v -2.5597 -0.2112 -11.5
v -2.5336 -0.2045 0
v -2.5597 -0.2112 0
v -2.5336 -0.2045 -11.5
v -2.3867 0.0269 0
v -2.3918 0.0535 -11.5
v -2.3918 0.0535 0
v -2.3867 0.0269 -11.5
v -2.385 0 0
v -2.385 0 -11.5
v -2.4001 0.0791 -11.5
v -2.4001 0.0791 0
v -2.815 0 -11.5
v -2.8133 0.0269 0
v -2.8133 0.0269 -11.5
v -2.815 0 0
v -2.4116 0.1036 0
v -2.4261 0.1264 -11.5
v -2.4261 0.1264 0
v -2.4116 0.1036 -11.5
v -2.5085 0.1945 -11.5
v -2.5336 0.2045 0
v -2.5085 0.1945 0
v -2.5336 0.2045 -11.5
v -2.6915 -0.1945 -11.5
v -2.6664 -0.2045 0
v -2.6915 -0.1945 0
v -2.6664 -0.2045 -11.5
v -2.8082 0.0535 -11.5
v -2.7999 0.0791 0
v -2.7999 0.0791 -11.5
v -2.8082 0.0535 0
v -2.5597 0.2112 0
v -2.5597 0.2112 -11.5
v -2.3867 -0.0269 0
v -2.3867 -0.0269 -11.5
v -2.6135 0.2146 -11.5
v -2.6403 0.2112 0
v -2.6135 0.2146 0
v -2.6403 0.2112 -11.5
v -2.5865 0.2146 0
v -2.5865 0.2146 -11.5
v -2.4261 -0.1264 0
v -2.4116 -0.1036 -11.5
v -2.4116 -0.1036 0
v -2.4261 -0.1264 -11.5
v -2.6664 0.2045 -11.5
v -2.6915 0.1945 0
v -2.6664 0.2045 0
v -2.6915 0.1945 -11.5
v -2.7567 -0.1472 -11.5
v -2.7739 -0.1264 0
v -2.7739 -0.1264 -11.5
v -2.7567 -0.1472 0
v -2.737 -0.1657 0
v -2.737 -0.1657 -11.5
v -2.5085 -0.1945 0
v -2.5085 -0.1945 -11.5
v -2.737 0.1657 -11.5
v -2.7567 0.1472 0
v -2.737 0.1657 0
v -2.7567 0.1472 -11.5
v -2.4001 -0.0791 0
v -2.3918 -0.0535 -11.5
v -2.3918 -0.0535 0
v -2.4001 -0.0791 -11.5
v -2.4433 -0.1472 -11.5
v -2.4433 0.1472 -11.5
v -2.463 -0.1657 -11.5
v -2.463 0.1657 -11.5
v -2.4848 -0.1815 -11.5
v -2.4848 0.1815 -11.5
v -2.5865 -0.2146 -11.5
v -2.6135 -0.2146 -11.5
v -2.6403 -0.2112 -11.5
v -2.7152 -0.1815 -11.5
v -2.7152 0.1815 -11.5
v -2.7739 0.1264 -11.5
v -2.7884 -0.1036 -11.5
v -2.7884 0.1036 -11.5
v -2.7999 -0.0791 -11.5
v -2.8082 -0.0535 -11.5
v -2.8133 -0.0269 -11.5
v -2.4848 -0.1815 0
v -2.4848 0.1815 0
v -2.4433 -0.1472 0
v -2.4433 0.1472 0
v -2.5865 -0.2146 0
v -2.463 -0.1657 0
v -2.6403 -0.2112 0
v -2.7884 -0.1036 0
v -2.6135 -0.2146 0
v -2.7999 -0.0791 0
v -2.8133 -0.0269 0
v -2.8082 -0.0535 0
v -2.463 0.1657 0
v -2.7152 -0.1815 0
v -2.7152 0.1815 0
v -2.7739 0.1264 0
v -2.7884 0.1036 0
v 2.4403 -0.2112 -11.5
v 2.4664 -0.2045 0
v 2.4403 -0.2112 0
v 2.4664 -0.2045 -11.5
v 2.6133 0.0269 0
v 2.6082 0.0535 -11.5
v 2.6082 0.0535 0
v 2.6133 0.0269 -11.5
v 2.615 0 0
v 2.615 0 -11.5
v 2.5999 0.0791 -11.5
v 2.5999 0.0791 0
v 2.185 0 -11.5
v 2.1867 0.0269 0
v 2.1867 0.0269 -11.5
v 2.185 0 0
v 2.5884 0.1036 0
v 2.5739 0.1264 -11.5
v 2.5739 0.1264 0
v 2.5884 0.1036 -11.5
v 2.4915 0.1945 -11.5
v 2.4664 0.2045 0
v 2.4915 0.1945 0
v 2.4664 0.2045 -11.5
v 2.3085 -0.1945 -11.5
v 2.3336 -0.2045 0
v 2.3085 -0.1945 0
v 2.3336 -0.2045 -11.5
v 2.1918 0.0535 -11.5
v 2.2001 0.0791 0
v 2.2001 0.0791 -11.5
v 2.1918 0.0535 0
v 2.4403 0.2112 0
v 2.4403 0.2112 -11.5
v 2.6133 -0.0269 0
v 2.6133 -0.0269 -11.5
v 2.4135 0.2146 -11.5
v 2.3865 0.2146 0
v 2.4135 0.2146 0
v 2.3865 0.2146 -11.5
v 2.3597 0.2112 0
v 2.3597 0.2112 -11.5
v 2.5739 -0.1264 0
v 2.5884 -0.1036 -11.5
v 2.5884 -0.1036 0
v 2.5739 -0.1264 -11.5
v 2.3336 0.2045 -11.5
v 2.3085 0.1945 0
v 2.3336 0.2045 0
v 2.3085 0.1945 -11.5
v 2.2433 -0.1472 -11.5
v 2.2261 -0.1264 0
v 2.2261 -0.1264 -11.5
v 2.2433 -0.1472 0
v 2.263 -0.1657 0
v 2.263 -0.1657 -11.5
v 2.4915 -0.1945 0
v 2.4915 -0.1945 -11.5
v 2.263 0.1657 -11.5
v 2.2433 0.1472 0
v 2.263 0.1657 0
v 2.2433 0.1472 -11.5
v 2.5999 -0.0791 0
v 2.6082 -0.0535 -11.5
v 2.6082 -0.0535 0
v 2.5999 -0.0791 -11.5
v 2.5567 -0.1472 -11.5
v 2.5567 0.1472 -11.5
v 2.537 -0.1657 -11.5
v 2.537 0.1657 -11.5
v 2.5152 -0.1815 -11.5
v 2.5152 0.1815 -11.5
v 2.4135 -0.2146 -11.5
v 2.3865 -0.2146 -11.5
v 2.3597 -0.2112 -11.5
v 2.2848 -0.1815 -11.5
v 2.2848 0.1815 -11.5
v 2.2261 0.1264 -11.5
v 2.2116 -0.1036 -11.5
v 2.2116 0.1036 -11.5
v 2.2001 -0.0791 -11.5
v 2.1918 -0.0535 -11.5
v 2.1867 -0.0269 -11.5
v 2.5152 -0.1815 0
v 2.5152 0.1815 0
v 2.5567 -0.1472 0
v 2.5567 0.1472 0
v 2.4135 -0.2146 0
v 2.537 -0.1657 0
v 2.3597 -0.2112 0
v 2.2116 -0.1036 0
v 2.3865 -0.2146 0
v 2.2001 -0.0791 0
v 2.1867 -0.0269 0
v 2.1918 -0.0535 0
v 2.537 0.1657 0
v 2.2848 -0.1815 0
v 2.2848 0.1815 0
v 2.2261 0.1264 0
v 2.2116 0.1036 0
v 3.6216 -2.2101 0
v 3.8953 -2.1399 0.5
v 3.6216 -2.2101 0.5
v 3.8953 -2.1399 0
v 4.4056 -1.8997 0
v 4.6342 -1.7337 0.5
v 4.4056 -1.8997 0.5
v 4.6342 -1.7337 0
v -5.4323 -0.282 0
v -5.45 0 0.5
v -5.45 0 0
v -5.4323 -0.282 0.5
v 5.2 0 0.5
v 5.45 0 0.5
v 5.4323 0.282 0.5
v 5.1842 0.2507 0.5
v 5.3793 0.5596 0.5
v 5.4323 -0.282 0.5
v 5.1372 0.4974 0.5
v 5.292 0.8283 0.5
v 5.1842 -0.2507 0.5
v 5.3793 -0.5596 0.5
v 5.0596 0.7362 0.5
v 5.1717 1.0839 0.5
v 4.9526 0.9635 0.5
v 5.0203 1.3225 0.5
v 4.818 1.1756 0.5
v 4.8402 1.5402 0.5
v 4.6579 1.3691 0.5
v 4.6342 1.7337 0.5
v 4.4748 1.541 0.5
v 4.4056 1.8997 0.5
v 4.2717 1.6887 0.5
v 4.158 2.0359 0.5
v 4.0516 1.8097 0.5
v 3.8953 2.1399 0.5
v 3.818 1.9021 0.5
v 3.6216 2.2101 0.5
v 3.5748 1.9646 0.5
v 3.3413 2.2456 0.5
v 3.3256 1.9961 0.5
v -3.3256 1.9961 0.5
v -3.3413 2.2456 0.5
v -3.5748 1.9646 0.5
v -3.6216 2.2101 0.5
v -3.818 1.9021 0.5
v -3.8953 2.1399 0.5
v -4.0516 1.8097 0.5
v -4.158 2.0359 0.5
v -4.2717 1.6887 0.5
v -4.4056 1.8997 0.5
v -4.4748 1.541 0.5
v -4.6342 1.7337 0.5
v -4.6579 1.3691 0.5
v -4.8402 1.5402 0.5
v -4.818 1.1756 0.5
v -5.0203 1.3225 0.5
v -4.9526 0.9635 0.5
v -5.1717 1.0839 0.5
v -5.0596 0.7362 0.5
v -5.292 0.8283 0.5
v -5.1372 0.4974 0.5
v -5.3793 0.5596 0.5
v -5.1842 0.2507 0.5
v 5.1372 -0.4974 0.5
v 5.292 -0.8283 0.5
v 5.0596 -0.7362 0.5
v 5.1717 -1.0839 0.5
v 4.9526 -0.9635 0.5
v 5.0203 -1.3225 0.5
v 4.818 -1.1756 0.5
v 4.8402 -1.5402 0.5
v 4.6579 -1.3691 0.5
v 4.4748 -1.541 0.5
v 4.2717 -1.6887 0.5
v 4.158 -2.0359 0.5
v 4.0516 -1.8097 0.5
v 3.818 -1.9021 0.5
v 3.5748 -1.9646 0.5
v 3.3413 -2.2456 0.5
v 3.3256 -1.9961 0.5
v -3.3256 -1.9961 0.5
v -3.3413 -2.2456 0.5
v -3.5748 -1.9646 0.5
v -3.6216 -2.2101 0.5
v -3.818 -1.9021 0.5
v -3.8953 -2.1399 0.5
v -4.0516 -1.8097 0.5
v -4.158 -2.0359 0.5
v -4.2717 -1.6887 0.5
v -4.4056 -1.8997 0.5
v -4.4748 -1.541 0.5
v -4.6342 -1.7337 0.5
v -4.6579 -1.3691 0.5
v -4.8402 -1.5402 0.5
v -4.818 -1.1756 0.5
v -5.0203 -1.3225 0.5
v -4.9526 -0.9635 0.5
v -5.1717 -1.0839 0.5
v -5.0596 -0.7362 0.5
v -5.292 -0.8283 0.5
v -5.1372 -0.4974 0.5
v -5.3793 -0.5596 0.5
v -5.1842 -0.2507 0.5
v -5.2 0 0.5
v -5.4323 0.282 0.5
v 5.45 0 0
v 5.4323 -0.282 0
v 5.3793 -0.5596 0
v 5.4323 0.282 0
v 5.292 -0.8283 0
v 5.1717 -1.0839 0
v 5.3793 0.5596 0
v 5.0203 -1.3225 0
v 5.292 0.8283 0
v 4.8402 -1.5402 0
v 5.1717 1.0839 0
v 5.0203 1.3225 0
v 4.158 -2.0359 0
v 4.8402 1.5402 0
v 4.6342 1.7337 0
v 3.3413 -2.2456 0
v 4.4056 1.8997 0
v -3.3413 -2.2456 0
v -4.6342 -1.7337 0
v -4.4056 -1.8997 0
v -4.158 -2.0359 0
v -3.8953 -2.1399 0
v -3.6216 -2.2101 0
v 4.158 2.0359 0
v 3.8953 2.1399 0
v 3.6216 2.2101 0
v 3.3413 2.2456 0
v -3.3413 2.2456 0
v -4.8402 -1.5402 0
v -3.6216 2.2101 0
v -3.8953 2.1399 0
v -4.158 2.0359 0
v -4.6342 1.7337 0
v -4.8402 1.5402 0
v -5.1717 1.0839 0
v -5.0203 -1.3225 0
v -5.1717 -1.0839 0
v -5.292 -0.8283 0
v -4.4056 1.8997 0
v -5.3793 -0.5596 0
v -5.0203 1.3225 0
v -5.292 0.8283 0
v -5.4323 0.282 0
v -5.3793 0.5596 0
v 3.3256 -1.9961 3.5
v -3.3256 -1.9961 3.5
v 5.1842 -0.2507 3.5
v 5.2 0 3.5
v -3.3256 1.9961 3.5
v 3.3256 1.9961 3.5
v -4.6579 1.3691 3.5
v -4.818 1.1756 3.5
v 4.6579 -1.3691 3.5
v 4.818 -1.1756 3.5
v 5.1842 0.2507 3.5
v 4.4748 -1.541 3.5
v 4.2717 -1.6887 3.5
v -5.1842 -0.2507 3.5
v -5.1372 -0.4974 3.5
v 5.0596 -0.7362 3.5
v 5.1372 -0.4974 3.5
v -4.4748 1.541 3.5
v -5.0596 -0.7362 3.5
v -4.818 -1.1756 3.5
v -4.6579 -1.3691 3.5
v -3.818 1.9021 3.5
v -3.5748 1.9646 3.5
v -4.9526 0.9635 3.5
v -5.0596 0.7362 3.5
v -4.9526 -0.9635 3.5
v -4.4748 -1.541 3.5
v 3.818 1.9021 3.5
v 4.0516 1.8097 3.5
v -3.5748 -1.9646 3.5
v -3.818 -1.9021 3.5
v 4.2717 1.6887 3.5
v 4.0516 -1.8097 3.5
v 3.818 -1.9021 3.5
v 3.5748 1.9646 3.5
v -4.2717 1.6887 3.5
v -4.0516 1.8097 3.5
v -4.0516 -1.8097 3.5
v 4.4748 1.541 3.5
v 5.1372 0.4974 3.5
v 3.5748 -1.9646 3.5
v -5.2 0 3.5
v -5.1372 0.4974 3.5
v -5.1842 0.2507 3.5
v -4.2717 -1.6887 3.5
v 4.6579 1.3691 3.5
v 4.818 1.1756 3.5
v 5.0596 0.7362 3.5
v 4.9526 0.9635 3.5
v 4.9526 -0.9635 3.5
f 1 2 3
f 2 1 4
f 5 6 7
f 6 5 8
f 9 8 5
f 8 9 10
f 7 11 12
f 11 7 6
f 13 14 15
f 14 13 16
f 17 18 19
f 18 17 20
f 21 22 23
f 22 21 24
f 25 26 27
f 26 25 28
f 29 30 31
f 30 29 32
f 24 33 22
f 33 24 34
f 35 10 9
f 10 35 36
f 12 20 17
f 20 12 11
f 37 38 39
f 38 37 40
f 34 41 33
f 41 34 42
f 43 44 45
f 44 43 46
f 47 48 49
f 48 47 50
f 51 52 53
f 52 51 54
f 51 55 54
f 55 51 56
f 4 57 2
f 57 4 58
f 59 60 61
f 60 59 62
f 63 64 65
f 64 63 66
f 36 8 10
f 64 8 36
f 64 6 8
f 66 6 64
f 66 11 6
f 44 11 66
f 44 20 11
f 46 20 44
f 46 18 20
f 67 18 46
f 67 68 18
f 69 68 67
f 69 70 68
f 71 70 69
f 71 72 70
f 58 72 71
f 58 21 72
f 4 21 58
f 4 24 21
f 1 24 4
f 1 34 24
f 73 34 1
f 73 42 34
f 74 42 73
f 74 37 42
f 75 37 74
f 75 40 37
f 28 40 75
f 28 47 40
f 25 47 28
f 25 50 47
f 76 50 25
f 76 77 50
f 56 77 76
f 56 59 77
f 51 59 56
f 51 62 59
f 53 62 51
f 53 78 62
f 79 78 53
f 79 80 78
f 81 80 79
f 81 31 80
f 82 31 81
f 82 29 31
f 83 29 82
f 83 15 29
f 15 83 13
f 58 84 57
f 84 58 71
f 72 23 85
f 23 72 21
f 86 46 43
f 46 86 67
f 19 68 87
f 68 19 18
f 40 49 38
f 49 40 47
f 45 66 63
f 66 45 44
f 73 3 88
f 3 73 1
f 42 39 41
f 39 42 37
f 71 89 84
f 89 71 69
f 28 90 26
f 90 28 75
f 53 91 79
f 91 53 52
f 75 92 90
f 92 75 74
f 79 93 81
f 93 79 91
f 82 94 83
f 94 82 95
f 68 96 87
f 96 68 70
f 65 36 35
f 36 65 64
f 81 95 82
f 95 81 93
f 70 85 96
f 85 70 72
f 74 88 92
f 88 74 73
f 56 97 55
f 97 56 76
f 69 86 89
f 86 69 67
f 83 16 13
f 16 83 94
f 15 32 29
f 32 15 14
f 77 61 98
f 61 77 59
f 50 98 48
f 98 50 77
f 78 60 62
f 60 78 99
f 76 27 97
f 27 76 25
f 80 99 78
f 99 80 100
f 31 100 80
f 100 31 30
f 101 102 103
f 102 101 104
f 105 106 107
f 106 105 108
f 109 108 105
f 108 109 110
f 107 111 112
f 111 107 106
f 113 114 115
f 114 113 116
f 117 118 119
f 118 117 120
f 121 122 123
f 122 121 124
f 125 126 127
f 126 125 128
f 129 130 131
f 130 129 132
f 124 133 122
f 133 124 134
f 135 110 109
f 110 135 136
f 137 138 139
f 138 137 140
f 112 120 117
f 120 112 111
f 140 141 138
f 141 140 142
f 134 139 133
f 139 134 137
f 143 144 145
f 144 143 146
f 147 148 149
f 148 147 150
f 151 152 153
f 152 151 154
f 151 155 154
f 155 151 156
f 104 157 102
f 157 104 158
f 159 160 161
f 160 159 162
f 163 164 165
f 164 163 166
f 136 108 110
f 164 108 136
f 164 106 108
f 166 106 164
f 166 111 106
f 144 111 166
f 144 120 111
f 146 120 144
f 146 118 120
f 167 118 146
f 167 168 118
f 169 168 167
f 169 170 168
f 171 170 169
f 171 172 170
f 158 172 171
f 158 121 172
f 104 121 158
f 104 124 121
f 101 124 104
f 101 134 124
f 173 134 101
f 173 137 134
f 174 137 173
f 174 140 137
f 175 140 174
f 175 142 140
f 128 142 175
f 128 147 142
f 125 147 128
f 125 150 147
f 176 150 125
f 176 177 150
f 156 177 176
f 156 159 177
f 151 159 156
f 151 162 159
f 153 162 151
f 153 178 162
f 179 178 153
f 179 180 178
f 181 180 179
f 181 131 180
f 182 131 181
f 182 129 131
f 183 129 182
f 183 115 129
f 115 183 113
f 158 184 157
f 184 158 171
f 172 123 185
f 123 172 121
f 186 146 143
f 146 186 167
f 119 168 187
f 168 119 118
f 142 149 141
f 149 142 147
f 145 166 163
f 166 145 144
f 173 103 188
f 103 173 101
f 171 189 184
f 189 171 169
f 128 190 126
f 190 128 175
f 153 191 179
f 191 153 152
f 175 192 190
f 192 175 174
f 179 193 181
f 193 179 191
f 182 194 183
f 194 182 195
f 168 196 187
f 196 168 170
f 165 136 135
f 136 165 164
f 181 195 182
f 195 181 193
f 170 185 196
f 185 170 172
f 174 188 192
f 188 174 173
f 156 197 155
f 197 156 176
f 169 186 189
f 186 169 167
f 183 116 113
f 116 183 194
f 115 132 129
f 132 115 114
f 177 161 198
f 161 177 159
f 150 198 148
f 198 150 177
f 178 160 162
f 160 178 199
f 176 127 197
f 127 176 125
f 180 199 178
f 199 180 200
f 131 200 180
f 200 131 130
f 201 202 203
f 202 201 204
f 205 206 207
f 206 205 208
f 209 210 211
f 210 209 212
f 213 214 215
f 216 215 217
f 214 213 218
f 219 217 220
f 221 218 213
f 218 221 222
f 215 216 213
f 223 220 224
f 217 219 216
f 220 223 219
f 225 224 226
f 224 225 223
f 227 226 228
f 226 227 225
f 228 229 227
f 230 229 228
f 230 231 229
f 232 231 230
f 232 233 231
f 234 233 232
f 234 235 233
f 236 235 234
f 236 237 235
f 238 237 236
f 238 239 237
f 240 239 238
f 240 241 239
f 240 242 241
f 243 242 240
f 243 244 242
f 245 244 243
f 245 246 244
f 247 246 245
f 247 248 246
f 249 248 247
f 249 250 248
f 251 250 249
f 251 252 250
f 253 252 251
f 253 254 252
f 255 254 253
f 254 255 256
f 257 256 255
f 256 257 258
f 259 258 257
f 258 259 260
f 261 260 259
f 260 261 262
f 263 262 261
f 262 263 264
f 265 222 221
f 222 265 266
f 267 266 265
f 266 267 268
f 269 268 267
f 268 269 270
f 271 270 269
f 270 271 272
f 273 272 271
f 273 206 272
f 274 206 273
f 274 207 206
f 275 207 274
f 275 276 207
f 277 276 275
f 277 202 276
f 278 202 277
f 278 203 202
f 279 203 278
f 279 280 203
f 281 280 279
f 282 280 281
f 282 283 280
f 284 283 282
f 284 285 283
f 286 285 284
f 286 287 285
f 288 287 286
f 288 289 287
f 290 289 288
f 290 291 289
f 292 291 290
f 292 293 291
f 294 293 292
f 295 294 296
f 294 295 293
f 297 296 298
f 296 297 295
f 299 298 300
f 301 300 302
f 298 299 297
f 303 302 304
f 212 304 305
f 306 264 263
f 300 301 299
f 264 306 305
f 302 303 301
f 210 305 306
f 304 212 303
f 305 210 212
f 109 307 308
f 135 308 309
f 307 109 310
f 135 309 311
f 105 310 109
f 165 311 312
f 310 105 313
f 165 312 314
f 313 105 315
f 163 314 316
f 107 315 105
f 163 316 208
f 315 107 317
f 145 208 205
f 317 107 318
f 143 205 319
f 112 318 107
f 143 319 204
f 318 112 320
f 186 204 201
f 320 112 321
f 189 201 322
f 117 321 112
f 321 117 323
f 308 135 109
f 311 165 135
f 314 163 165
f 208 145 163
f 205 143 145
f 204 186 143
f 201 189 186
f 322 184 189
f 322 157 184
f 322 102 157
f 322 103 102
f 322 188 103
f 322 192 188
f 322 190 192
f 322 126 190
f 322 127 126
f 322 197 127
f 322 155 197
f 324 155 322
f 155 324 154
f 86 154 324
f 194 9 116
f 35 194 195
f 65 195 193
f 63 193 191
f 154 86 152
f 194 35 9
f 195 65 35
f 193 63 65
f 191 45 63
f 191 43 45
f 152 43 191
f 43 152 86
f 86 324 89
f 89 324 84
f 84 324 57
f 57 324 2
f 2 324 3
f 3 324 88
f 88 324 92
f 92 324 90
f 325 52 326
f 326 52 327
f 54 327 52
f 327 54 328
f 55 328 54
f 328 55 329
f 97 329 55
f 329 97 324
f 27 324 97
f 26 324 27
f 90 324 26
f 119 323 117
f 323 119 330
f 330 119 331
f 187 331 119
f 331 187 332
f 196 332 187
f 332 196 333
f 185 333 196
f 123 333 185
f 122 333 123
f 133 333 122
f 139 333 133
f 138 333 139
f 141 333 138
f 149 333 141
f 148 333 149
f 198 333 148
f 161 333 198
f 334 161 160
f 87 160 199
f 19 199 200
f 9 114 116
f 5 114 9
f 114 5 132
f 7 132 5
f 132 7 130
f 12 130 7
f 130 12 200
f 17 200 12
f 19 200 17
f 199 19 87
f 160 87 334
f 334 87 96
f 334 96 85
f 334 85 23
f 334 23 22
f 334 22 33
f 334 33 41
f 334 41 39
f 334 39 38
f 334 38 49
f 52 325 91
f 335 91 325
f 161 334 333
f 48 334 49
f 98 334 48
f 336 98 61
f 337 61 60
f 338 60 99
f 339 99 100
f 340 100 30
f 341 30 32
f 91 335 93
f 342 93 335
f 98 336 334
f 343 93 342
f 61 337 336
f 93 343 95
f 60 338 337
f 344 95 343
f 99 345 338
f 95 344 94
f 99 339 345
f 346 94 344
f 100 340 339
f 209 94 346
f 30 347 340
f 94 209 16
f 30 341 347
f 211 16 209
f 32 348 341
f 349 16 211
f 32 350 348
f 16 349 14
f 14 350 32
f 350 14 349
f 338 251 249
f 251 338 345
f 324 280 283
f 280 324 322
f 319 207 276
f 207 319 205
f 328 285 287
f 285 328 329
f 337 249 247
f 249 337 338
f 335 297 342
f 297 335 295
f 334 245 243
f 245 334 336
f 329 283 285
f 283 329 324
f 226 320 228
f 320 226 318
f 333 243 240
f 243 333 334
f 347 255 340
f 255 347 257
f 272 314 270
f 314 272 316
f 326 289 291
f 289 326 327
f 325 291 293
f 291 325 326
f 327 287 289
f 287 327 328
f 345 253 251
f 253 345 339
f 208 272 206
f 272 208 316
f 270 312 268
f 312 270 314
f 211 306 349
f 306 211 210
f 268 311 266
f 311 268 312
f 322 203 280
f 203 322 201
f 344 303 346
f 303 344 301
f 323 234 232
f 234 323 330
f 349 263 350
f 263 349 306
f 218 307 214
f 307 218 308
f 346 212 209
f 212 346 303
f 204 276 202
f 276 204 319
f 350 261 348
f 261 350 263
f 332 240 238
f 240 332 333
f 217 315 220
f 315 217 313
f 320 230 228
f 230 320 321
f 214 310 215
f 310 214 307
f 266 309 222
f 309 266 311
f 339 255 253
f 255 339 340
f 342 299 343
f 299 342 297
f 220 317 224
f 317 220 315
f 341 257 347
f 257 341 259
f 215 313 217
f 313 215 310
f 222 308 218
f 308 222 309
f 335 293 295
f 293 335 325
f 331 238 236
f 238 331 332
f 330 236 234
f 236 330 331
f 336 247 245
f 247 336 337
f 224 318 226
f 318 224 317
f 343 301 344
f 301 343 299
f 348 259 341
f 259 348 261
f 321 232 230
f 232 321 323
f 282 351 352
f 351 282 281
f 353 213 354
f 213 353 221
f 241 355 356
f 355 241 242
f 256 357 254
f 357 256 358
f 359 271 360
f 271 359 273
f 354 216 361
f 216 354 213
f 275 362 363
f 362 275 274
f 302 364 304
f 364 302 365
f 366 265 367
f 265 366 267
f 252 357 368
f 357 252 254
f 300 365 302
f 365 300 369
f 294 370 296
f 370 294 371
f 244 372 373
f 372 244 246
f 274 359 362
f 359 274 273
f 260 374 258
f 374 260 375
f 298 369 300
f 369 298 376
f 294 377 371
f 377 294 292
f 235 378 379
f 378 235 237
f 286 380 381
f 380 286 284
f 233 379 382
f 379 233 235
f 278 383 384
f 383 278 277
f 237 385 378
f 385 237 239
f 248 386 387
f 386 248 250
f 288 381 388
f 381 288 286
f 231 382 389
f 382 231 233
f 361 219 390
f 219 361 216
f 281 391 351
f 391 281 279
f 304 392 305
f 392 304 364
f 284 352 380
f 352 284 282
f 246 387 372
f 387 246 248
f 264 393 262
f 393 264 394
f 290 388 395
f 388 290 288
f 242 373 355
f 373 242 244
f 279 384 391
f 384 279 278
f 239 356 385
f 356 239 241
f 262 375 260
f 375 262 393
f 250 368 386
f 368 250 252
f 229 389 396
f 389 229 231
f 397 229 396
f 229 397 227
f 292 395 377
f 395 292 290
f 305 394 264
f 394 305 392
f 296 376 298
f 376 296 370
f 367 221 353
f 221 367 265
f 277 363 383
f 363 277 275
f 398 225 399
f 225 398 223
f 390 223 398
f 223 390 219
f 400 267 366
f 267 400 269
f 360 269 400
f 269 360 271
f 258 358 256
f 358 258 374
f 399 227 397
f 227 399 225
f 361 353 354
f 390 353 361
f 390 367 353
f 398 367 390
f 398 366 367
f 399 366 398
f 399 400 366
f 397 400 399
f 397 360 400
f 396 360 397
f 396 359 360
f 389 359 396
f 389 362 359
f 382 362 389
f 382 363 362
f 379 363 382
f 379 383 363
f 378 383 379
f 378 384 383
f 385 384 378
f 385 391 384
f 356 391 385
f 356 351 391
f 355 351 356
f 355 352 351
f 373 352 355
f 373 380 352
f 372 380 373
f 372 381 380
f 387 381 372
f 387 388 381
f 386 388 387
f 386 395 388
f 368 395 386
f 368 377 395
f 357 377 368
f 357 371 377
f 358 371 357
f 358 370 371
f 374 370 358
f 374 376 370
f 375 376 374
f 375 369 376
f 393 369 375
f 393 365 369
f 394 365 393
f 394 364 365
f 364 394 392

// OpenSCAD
module cylinders(points, diameter, thickness) {
  for (p=points) {
    translate(p) {
      cylinder(d=diameter, h=thickness);
    }
  }
}

module crystal() {
  $fn = 50;
  translate([0, 0, 0]) {
    color("silver") {
      difference() {
        hull() {
          cylinders([[0, 0, 0], [10.9 - 4.5, 0, 0]], 4.5, 0.5);
        }
      }
    }
  }

  translate([0, 0, 0]) {
    color("silver") {
      difference() {
        hull() {
          cylinders([[0, 0, 0], [10.9 - 4.5, 0, 0]], 4, 3.5);
        }
      }
    }
  }

  translate([0, 0, -11.5]) {
    translate([0.6, 0, 0]) {
      color("silver") {
        cylinder(d=0.43, h=12.5);
      }
      translate([5, 0, 0]) {
        color("silver") {
          cylinder(d=0.43, h=12.5);
        }
      }
    }
  }
}

translate([-3.2, 0, 0]) {
  crystal();
}
